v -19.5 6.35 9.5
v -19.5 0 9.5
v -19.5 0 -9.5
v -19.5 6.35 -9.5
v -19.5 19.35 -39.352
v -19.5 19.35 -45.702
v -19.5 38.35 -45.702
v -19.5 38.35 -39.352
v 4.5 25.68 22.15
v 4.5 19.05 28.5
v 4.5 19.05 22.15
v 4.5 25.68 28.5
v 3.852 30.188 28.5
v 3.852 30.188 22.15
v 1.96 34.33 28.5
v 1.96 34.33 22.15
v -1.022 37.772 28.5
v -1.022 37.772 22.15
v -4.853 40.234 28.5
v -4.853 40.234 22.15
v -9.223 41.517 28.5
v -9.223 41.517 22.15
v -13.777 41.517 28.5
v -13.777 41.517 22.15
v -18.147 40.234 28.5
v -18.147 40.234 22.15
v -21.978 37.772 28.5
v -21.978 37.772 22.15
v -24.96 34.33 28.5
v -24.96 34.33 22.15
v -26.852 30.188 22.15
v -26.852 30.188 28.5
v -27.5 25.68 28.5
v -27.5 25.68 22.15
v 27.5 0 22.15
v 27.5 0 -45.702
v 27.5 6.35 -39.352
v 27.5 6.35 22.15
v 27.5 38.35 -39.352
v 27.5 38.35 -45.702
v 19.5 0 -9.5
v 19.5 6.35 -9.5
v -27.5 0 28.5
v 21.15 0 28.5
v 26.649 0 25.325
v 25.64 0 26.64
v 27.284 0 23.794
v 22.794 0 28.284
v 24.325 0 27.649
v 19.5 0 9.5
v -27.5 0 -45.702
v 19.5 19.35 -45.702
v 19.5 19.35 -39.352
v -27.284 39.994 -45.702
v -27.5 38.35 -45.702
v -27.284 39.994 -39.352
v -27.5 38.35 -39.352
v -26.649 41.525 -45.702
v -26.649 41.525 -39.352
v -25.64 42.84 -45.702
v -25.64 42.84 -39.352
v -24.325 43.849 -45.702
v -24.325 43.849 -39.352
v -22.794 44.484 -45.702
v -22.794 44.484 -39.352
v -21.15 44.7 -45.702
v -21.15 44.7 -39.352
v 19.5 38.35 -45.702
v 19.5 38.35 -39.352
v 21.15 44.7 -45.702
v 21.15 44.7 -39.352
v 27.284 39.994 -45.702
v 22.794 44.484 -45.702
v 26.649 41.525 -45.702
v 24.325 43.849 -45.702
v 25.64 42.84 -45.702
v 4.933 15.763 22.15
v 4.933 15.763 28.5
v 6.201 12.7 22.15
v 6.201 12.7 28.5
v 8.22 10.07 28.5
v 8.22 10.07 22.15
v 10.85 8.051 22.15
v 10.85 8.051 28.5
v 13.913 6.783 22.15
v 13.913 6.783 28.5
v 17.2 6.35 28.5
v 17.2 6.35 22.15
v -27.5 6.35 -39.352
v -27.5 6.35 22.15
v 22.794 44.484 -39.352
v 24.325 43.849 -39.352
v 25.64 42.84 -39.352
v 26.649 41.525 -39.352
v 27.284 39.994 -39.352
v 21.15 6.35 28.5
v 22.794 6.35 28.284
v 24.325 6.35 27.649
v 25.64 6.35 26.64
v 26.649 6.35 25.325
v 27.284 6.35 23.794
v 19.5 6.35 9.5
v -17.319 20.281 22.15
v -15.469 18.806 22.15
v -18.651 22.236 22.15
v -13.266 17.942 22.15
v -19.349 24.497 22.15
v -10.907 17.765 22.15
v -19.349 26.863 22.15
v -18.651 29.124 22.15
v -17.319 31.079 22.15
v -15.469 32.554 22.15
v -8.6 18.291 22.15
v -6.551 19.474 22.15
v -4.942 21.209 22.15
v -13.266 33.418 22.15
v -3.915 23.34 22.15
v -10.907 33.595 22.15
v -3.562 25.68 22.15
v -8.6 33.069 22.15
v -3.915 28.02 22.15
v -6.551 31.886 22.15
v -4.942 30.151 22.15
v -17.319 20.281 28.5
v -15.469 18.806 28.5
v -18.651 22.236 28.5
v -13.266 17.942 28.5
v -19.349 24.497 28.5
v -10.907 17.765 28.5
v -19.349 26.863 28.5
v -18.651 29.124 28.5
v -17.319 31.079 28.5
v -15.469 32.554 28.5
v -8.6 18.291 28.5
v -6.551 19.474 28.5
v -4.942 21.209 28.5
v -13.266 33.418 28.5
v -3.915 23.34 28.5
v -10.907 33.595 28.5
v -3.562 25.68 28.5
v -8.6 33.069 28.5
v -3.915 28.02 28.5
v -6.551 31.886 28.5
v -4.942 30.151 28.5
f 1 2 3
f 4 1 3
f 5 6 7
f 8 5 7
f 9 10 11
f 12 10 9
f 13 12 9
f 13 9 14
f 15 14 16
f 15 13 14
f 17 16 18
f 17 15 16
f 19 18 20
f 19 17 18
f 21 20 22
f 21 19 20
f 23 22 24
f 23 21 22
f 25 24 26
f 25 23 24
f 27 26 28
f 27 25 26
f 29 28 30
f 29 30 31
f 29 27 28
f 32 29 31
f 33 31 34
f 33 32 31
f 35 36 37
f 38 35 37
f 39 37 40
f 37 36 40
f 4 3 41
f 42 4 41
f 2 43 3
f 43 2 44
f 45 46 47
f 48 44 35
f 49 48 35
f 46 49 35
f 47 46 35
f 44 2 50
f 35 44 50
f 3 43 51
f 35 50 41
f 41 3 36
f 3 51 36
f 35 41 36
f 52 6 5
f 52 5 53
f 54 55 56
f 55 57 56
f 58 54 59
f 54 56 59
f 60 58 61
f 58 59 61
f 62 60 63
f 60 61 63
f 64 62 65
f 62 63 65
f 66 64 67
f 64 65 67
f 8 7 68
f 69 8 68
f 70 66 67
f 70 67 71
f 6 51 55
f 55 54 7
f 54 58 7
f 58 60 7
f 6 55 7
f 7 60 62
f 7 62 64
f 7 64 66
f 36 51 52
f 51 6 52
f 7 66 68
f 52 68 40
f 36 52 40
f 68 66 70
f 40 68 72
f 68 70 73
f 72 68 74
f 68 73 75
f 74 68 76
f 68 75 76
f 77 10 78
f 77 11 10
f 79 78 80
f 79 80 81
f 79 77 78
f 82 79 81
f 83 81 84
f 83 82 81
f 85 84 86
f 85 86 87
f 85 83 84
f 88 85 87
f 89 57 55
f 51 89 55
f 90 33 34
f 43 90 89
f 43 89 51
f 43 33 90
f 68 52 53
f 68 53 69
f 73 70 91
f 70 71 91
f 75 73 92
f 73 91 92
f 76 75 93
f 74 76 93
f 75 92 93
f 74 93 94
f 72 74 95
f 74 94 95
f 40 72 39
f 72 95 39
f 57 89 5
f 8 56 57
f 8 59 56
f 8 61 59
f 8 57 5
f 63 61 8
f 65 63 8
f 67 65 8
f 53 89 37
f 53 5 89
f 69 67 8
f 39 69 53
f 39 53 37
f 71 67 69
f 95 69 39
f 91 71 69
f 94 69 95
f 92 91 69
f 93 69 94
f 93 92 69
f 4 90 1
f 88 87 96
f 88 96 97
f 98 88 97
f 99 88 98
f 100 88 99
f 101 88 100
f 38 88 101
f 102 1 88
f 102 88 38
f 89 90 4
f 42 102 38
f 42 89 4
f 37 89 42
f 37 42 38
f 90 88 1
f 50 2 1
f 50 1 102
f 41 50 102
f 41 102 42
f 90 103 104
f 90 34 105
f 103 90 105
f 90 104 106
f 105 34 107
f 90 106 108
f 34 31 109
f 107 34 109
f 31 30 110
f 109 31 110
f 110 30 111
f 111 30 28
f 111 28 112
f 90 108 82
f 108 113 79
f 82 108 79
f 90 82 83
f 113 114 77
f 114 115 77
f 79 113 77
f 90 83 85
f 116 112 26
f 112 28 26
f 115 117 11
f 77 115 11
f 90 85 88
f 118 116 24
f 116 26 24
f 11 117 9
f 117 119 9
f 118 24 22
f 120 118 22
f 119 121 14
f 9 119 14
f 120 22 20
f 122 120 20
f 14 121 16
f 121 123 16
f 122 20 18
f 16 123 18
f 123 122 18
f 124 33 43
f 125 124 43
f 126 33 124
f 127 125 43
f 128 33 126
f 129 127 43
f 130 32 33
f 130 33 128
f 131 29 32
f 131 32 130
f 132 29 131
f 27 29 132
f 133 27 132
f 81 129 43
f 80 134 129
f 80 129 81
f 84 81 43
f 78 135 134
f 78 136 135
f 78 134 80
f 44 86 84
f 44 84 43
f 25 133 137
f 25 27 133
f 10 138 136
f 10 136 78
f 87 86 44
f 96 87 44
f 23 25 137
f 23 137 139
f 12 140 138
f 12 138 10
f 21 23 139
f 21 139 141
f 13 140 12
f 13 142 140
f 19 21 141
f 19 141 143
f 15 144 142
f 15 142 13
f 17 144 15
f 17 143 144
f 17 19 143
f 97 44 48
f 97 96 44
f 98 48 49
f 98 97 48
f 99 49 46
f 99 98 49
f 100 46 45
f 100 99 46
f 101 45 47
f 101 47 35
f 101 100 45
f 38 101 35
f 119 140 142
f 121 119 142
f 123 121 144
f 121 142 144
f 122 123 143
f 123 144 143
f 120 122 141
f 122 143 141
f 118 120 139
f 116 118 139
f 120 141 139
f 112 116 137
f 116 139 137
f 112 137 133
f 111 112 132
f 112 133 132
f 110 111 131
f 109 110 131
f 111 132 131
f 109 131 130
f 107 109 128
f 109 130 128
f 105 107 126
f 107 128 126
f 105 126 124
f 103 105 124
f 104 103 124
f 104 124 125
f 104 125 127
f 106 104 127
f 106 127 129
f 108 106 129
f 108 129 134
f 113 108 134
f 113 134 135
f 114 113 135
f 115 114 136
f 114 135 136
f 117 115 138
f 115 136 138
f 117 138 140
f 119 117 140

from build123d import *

# Parameters (mm, degrees)
SKETCH1_W            = 55
SKETCH1_H            = 74.202
SKETCH1_W_2          = 39
SKETCH1_H_2          = 19
BOSS_EXTRUDE1_DEPTH  = 6.35
SKETCH2_W            = 55
SKETCH2_H            = 38.35
SKETCH2_W_2          = 39
SKETCH2_H_2          = 19
BOSS_EXTRUDE2_DEPTH  = 6.35
SKETCH12_R           = 7.9375
BOSS_EXTRUDE11_DEPTH = 6.35
FILLET2_R            = 12.7
FILLET1_R            = 6.35


with BuildPart() as part:
    # Sketch1 → Boss-Extrude1 (new body)
    with BuildSketch(Plane(origin=(0, 0, 0), x_dir=(1, 0, 0), z_dir=(0, 1, 0))):
        with Locations((0, 8.601)):
            Rectangle(SKETCH1_W, SKETCH1_H)
        Rectangle(SKETCH1_W_2, SKETCH1_H_2, mode=Mode.SUBTRACT)
    extrude(amount=BOSS_EXTRUDE1_DEPTH)

    # Sketch2 → Boss-Extrude2 (add)
    with BuildSketch(Plane.XY.offset(-45.702)):
        with Locations((0, 25.525)):
            Rectangle(SKETCH2_W, SKETCH2_H)
        with Locations((0, 28.85)):
            Rectangle(SKETCH2_W_2, SKETCH2_H_2, mode=Mode.SUBTRACT)
    extrude(amount=BOSS_EXTRUDE2_DEPTH)

    # Sketch12 → Boss-Extrude11 (add)
    with BuildSketch(Plane.XY.offset(28.5)):
        with BuildLine():
            Line((-27.5, 25.68), (-27.5, 6.35))
            Line((-27.5, 6.35), (4.5, 6.35))
            Line((4.5, 6.35), (4.5, 25.68))
            ThreePointArc((4.5, 25.68), (-11.5, 41.68), (-27.5, 25.68))
        make_face()
        with Locations((-11.5, 25.68)):
            Circle(SKETCH12_R, mode=Mode.SUBTRACT)
    extrude(amount=-BOSS_EXTRUDE11_DEPTH)

    # Fillet2
    fillet2_edges = [part.edges().sort_by_distance(p)[0] for p in [
        (4.5, 6.35, 25.325),
    ]]
    fillet(fillet2_edges, radius=FILLET2_R)

    # Fillet1
    fillet1_edges = [part.edges().sort_by_distance(p)[0] for p in [
        (27.5, 44.7, -42.527),
        (-27.5, 44.7, -42.527),
        (27.5, 3.175, 28.5),
    ]]
    fillet(fillet1_edges, radius=FILLET1_R)


solid = part.part
